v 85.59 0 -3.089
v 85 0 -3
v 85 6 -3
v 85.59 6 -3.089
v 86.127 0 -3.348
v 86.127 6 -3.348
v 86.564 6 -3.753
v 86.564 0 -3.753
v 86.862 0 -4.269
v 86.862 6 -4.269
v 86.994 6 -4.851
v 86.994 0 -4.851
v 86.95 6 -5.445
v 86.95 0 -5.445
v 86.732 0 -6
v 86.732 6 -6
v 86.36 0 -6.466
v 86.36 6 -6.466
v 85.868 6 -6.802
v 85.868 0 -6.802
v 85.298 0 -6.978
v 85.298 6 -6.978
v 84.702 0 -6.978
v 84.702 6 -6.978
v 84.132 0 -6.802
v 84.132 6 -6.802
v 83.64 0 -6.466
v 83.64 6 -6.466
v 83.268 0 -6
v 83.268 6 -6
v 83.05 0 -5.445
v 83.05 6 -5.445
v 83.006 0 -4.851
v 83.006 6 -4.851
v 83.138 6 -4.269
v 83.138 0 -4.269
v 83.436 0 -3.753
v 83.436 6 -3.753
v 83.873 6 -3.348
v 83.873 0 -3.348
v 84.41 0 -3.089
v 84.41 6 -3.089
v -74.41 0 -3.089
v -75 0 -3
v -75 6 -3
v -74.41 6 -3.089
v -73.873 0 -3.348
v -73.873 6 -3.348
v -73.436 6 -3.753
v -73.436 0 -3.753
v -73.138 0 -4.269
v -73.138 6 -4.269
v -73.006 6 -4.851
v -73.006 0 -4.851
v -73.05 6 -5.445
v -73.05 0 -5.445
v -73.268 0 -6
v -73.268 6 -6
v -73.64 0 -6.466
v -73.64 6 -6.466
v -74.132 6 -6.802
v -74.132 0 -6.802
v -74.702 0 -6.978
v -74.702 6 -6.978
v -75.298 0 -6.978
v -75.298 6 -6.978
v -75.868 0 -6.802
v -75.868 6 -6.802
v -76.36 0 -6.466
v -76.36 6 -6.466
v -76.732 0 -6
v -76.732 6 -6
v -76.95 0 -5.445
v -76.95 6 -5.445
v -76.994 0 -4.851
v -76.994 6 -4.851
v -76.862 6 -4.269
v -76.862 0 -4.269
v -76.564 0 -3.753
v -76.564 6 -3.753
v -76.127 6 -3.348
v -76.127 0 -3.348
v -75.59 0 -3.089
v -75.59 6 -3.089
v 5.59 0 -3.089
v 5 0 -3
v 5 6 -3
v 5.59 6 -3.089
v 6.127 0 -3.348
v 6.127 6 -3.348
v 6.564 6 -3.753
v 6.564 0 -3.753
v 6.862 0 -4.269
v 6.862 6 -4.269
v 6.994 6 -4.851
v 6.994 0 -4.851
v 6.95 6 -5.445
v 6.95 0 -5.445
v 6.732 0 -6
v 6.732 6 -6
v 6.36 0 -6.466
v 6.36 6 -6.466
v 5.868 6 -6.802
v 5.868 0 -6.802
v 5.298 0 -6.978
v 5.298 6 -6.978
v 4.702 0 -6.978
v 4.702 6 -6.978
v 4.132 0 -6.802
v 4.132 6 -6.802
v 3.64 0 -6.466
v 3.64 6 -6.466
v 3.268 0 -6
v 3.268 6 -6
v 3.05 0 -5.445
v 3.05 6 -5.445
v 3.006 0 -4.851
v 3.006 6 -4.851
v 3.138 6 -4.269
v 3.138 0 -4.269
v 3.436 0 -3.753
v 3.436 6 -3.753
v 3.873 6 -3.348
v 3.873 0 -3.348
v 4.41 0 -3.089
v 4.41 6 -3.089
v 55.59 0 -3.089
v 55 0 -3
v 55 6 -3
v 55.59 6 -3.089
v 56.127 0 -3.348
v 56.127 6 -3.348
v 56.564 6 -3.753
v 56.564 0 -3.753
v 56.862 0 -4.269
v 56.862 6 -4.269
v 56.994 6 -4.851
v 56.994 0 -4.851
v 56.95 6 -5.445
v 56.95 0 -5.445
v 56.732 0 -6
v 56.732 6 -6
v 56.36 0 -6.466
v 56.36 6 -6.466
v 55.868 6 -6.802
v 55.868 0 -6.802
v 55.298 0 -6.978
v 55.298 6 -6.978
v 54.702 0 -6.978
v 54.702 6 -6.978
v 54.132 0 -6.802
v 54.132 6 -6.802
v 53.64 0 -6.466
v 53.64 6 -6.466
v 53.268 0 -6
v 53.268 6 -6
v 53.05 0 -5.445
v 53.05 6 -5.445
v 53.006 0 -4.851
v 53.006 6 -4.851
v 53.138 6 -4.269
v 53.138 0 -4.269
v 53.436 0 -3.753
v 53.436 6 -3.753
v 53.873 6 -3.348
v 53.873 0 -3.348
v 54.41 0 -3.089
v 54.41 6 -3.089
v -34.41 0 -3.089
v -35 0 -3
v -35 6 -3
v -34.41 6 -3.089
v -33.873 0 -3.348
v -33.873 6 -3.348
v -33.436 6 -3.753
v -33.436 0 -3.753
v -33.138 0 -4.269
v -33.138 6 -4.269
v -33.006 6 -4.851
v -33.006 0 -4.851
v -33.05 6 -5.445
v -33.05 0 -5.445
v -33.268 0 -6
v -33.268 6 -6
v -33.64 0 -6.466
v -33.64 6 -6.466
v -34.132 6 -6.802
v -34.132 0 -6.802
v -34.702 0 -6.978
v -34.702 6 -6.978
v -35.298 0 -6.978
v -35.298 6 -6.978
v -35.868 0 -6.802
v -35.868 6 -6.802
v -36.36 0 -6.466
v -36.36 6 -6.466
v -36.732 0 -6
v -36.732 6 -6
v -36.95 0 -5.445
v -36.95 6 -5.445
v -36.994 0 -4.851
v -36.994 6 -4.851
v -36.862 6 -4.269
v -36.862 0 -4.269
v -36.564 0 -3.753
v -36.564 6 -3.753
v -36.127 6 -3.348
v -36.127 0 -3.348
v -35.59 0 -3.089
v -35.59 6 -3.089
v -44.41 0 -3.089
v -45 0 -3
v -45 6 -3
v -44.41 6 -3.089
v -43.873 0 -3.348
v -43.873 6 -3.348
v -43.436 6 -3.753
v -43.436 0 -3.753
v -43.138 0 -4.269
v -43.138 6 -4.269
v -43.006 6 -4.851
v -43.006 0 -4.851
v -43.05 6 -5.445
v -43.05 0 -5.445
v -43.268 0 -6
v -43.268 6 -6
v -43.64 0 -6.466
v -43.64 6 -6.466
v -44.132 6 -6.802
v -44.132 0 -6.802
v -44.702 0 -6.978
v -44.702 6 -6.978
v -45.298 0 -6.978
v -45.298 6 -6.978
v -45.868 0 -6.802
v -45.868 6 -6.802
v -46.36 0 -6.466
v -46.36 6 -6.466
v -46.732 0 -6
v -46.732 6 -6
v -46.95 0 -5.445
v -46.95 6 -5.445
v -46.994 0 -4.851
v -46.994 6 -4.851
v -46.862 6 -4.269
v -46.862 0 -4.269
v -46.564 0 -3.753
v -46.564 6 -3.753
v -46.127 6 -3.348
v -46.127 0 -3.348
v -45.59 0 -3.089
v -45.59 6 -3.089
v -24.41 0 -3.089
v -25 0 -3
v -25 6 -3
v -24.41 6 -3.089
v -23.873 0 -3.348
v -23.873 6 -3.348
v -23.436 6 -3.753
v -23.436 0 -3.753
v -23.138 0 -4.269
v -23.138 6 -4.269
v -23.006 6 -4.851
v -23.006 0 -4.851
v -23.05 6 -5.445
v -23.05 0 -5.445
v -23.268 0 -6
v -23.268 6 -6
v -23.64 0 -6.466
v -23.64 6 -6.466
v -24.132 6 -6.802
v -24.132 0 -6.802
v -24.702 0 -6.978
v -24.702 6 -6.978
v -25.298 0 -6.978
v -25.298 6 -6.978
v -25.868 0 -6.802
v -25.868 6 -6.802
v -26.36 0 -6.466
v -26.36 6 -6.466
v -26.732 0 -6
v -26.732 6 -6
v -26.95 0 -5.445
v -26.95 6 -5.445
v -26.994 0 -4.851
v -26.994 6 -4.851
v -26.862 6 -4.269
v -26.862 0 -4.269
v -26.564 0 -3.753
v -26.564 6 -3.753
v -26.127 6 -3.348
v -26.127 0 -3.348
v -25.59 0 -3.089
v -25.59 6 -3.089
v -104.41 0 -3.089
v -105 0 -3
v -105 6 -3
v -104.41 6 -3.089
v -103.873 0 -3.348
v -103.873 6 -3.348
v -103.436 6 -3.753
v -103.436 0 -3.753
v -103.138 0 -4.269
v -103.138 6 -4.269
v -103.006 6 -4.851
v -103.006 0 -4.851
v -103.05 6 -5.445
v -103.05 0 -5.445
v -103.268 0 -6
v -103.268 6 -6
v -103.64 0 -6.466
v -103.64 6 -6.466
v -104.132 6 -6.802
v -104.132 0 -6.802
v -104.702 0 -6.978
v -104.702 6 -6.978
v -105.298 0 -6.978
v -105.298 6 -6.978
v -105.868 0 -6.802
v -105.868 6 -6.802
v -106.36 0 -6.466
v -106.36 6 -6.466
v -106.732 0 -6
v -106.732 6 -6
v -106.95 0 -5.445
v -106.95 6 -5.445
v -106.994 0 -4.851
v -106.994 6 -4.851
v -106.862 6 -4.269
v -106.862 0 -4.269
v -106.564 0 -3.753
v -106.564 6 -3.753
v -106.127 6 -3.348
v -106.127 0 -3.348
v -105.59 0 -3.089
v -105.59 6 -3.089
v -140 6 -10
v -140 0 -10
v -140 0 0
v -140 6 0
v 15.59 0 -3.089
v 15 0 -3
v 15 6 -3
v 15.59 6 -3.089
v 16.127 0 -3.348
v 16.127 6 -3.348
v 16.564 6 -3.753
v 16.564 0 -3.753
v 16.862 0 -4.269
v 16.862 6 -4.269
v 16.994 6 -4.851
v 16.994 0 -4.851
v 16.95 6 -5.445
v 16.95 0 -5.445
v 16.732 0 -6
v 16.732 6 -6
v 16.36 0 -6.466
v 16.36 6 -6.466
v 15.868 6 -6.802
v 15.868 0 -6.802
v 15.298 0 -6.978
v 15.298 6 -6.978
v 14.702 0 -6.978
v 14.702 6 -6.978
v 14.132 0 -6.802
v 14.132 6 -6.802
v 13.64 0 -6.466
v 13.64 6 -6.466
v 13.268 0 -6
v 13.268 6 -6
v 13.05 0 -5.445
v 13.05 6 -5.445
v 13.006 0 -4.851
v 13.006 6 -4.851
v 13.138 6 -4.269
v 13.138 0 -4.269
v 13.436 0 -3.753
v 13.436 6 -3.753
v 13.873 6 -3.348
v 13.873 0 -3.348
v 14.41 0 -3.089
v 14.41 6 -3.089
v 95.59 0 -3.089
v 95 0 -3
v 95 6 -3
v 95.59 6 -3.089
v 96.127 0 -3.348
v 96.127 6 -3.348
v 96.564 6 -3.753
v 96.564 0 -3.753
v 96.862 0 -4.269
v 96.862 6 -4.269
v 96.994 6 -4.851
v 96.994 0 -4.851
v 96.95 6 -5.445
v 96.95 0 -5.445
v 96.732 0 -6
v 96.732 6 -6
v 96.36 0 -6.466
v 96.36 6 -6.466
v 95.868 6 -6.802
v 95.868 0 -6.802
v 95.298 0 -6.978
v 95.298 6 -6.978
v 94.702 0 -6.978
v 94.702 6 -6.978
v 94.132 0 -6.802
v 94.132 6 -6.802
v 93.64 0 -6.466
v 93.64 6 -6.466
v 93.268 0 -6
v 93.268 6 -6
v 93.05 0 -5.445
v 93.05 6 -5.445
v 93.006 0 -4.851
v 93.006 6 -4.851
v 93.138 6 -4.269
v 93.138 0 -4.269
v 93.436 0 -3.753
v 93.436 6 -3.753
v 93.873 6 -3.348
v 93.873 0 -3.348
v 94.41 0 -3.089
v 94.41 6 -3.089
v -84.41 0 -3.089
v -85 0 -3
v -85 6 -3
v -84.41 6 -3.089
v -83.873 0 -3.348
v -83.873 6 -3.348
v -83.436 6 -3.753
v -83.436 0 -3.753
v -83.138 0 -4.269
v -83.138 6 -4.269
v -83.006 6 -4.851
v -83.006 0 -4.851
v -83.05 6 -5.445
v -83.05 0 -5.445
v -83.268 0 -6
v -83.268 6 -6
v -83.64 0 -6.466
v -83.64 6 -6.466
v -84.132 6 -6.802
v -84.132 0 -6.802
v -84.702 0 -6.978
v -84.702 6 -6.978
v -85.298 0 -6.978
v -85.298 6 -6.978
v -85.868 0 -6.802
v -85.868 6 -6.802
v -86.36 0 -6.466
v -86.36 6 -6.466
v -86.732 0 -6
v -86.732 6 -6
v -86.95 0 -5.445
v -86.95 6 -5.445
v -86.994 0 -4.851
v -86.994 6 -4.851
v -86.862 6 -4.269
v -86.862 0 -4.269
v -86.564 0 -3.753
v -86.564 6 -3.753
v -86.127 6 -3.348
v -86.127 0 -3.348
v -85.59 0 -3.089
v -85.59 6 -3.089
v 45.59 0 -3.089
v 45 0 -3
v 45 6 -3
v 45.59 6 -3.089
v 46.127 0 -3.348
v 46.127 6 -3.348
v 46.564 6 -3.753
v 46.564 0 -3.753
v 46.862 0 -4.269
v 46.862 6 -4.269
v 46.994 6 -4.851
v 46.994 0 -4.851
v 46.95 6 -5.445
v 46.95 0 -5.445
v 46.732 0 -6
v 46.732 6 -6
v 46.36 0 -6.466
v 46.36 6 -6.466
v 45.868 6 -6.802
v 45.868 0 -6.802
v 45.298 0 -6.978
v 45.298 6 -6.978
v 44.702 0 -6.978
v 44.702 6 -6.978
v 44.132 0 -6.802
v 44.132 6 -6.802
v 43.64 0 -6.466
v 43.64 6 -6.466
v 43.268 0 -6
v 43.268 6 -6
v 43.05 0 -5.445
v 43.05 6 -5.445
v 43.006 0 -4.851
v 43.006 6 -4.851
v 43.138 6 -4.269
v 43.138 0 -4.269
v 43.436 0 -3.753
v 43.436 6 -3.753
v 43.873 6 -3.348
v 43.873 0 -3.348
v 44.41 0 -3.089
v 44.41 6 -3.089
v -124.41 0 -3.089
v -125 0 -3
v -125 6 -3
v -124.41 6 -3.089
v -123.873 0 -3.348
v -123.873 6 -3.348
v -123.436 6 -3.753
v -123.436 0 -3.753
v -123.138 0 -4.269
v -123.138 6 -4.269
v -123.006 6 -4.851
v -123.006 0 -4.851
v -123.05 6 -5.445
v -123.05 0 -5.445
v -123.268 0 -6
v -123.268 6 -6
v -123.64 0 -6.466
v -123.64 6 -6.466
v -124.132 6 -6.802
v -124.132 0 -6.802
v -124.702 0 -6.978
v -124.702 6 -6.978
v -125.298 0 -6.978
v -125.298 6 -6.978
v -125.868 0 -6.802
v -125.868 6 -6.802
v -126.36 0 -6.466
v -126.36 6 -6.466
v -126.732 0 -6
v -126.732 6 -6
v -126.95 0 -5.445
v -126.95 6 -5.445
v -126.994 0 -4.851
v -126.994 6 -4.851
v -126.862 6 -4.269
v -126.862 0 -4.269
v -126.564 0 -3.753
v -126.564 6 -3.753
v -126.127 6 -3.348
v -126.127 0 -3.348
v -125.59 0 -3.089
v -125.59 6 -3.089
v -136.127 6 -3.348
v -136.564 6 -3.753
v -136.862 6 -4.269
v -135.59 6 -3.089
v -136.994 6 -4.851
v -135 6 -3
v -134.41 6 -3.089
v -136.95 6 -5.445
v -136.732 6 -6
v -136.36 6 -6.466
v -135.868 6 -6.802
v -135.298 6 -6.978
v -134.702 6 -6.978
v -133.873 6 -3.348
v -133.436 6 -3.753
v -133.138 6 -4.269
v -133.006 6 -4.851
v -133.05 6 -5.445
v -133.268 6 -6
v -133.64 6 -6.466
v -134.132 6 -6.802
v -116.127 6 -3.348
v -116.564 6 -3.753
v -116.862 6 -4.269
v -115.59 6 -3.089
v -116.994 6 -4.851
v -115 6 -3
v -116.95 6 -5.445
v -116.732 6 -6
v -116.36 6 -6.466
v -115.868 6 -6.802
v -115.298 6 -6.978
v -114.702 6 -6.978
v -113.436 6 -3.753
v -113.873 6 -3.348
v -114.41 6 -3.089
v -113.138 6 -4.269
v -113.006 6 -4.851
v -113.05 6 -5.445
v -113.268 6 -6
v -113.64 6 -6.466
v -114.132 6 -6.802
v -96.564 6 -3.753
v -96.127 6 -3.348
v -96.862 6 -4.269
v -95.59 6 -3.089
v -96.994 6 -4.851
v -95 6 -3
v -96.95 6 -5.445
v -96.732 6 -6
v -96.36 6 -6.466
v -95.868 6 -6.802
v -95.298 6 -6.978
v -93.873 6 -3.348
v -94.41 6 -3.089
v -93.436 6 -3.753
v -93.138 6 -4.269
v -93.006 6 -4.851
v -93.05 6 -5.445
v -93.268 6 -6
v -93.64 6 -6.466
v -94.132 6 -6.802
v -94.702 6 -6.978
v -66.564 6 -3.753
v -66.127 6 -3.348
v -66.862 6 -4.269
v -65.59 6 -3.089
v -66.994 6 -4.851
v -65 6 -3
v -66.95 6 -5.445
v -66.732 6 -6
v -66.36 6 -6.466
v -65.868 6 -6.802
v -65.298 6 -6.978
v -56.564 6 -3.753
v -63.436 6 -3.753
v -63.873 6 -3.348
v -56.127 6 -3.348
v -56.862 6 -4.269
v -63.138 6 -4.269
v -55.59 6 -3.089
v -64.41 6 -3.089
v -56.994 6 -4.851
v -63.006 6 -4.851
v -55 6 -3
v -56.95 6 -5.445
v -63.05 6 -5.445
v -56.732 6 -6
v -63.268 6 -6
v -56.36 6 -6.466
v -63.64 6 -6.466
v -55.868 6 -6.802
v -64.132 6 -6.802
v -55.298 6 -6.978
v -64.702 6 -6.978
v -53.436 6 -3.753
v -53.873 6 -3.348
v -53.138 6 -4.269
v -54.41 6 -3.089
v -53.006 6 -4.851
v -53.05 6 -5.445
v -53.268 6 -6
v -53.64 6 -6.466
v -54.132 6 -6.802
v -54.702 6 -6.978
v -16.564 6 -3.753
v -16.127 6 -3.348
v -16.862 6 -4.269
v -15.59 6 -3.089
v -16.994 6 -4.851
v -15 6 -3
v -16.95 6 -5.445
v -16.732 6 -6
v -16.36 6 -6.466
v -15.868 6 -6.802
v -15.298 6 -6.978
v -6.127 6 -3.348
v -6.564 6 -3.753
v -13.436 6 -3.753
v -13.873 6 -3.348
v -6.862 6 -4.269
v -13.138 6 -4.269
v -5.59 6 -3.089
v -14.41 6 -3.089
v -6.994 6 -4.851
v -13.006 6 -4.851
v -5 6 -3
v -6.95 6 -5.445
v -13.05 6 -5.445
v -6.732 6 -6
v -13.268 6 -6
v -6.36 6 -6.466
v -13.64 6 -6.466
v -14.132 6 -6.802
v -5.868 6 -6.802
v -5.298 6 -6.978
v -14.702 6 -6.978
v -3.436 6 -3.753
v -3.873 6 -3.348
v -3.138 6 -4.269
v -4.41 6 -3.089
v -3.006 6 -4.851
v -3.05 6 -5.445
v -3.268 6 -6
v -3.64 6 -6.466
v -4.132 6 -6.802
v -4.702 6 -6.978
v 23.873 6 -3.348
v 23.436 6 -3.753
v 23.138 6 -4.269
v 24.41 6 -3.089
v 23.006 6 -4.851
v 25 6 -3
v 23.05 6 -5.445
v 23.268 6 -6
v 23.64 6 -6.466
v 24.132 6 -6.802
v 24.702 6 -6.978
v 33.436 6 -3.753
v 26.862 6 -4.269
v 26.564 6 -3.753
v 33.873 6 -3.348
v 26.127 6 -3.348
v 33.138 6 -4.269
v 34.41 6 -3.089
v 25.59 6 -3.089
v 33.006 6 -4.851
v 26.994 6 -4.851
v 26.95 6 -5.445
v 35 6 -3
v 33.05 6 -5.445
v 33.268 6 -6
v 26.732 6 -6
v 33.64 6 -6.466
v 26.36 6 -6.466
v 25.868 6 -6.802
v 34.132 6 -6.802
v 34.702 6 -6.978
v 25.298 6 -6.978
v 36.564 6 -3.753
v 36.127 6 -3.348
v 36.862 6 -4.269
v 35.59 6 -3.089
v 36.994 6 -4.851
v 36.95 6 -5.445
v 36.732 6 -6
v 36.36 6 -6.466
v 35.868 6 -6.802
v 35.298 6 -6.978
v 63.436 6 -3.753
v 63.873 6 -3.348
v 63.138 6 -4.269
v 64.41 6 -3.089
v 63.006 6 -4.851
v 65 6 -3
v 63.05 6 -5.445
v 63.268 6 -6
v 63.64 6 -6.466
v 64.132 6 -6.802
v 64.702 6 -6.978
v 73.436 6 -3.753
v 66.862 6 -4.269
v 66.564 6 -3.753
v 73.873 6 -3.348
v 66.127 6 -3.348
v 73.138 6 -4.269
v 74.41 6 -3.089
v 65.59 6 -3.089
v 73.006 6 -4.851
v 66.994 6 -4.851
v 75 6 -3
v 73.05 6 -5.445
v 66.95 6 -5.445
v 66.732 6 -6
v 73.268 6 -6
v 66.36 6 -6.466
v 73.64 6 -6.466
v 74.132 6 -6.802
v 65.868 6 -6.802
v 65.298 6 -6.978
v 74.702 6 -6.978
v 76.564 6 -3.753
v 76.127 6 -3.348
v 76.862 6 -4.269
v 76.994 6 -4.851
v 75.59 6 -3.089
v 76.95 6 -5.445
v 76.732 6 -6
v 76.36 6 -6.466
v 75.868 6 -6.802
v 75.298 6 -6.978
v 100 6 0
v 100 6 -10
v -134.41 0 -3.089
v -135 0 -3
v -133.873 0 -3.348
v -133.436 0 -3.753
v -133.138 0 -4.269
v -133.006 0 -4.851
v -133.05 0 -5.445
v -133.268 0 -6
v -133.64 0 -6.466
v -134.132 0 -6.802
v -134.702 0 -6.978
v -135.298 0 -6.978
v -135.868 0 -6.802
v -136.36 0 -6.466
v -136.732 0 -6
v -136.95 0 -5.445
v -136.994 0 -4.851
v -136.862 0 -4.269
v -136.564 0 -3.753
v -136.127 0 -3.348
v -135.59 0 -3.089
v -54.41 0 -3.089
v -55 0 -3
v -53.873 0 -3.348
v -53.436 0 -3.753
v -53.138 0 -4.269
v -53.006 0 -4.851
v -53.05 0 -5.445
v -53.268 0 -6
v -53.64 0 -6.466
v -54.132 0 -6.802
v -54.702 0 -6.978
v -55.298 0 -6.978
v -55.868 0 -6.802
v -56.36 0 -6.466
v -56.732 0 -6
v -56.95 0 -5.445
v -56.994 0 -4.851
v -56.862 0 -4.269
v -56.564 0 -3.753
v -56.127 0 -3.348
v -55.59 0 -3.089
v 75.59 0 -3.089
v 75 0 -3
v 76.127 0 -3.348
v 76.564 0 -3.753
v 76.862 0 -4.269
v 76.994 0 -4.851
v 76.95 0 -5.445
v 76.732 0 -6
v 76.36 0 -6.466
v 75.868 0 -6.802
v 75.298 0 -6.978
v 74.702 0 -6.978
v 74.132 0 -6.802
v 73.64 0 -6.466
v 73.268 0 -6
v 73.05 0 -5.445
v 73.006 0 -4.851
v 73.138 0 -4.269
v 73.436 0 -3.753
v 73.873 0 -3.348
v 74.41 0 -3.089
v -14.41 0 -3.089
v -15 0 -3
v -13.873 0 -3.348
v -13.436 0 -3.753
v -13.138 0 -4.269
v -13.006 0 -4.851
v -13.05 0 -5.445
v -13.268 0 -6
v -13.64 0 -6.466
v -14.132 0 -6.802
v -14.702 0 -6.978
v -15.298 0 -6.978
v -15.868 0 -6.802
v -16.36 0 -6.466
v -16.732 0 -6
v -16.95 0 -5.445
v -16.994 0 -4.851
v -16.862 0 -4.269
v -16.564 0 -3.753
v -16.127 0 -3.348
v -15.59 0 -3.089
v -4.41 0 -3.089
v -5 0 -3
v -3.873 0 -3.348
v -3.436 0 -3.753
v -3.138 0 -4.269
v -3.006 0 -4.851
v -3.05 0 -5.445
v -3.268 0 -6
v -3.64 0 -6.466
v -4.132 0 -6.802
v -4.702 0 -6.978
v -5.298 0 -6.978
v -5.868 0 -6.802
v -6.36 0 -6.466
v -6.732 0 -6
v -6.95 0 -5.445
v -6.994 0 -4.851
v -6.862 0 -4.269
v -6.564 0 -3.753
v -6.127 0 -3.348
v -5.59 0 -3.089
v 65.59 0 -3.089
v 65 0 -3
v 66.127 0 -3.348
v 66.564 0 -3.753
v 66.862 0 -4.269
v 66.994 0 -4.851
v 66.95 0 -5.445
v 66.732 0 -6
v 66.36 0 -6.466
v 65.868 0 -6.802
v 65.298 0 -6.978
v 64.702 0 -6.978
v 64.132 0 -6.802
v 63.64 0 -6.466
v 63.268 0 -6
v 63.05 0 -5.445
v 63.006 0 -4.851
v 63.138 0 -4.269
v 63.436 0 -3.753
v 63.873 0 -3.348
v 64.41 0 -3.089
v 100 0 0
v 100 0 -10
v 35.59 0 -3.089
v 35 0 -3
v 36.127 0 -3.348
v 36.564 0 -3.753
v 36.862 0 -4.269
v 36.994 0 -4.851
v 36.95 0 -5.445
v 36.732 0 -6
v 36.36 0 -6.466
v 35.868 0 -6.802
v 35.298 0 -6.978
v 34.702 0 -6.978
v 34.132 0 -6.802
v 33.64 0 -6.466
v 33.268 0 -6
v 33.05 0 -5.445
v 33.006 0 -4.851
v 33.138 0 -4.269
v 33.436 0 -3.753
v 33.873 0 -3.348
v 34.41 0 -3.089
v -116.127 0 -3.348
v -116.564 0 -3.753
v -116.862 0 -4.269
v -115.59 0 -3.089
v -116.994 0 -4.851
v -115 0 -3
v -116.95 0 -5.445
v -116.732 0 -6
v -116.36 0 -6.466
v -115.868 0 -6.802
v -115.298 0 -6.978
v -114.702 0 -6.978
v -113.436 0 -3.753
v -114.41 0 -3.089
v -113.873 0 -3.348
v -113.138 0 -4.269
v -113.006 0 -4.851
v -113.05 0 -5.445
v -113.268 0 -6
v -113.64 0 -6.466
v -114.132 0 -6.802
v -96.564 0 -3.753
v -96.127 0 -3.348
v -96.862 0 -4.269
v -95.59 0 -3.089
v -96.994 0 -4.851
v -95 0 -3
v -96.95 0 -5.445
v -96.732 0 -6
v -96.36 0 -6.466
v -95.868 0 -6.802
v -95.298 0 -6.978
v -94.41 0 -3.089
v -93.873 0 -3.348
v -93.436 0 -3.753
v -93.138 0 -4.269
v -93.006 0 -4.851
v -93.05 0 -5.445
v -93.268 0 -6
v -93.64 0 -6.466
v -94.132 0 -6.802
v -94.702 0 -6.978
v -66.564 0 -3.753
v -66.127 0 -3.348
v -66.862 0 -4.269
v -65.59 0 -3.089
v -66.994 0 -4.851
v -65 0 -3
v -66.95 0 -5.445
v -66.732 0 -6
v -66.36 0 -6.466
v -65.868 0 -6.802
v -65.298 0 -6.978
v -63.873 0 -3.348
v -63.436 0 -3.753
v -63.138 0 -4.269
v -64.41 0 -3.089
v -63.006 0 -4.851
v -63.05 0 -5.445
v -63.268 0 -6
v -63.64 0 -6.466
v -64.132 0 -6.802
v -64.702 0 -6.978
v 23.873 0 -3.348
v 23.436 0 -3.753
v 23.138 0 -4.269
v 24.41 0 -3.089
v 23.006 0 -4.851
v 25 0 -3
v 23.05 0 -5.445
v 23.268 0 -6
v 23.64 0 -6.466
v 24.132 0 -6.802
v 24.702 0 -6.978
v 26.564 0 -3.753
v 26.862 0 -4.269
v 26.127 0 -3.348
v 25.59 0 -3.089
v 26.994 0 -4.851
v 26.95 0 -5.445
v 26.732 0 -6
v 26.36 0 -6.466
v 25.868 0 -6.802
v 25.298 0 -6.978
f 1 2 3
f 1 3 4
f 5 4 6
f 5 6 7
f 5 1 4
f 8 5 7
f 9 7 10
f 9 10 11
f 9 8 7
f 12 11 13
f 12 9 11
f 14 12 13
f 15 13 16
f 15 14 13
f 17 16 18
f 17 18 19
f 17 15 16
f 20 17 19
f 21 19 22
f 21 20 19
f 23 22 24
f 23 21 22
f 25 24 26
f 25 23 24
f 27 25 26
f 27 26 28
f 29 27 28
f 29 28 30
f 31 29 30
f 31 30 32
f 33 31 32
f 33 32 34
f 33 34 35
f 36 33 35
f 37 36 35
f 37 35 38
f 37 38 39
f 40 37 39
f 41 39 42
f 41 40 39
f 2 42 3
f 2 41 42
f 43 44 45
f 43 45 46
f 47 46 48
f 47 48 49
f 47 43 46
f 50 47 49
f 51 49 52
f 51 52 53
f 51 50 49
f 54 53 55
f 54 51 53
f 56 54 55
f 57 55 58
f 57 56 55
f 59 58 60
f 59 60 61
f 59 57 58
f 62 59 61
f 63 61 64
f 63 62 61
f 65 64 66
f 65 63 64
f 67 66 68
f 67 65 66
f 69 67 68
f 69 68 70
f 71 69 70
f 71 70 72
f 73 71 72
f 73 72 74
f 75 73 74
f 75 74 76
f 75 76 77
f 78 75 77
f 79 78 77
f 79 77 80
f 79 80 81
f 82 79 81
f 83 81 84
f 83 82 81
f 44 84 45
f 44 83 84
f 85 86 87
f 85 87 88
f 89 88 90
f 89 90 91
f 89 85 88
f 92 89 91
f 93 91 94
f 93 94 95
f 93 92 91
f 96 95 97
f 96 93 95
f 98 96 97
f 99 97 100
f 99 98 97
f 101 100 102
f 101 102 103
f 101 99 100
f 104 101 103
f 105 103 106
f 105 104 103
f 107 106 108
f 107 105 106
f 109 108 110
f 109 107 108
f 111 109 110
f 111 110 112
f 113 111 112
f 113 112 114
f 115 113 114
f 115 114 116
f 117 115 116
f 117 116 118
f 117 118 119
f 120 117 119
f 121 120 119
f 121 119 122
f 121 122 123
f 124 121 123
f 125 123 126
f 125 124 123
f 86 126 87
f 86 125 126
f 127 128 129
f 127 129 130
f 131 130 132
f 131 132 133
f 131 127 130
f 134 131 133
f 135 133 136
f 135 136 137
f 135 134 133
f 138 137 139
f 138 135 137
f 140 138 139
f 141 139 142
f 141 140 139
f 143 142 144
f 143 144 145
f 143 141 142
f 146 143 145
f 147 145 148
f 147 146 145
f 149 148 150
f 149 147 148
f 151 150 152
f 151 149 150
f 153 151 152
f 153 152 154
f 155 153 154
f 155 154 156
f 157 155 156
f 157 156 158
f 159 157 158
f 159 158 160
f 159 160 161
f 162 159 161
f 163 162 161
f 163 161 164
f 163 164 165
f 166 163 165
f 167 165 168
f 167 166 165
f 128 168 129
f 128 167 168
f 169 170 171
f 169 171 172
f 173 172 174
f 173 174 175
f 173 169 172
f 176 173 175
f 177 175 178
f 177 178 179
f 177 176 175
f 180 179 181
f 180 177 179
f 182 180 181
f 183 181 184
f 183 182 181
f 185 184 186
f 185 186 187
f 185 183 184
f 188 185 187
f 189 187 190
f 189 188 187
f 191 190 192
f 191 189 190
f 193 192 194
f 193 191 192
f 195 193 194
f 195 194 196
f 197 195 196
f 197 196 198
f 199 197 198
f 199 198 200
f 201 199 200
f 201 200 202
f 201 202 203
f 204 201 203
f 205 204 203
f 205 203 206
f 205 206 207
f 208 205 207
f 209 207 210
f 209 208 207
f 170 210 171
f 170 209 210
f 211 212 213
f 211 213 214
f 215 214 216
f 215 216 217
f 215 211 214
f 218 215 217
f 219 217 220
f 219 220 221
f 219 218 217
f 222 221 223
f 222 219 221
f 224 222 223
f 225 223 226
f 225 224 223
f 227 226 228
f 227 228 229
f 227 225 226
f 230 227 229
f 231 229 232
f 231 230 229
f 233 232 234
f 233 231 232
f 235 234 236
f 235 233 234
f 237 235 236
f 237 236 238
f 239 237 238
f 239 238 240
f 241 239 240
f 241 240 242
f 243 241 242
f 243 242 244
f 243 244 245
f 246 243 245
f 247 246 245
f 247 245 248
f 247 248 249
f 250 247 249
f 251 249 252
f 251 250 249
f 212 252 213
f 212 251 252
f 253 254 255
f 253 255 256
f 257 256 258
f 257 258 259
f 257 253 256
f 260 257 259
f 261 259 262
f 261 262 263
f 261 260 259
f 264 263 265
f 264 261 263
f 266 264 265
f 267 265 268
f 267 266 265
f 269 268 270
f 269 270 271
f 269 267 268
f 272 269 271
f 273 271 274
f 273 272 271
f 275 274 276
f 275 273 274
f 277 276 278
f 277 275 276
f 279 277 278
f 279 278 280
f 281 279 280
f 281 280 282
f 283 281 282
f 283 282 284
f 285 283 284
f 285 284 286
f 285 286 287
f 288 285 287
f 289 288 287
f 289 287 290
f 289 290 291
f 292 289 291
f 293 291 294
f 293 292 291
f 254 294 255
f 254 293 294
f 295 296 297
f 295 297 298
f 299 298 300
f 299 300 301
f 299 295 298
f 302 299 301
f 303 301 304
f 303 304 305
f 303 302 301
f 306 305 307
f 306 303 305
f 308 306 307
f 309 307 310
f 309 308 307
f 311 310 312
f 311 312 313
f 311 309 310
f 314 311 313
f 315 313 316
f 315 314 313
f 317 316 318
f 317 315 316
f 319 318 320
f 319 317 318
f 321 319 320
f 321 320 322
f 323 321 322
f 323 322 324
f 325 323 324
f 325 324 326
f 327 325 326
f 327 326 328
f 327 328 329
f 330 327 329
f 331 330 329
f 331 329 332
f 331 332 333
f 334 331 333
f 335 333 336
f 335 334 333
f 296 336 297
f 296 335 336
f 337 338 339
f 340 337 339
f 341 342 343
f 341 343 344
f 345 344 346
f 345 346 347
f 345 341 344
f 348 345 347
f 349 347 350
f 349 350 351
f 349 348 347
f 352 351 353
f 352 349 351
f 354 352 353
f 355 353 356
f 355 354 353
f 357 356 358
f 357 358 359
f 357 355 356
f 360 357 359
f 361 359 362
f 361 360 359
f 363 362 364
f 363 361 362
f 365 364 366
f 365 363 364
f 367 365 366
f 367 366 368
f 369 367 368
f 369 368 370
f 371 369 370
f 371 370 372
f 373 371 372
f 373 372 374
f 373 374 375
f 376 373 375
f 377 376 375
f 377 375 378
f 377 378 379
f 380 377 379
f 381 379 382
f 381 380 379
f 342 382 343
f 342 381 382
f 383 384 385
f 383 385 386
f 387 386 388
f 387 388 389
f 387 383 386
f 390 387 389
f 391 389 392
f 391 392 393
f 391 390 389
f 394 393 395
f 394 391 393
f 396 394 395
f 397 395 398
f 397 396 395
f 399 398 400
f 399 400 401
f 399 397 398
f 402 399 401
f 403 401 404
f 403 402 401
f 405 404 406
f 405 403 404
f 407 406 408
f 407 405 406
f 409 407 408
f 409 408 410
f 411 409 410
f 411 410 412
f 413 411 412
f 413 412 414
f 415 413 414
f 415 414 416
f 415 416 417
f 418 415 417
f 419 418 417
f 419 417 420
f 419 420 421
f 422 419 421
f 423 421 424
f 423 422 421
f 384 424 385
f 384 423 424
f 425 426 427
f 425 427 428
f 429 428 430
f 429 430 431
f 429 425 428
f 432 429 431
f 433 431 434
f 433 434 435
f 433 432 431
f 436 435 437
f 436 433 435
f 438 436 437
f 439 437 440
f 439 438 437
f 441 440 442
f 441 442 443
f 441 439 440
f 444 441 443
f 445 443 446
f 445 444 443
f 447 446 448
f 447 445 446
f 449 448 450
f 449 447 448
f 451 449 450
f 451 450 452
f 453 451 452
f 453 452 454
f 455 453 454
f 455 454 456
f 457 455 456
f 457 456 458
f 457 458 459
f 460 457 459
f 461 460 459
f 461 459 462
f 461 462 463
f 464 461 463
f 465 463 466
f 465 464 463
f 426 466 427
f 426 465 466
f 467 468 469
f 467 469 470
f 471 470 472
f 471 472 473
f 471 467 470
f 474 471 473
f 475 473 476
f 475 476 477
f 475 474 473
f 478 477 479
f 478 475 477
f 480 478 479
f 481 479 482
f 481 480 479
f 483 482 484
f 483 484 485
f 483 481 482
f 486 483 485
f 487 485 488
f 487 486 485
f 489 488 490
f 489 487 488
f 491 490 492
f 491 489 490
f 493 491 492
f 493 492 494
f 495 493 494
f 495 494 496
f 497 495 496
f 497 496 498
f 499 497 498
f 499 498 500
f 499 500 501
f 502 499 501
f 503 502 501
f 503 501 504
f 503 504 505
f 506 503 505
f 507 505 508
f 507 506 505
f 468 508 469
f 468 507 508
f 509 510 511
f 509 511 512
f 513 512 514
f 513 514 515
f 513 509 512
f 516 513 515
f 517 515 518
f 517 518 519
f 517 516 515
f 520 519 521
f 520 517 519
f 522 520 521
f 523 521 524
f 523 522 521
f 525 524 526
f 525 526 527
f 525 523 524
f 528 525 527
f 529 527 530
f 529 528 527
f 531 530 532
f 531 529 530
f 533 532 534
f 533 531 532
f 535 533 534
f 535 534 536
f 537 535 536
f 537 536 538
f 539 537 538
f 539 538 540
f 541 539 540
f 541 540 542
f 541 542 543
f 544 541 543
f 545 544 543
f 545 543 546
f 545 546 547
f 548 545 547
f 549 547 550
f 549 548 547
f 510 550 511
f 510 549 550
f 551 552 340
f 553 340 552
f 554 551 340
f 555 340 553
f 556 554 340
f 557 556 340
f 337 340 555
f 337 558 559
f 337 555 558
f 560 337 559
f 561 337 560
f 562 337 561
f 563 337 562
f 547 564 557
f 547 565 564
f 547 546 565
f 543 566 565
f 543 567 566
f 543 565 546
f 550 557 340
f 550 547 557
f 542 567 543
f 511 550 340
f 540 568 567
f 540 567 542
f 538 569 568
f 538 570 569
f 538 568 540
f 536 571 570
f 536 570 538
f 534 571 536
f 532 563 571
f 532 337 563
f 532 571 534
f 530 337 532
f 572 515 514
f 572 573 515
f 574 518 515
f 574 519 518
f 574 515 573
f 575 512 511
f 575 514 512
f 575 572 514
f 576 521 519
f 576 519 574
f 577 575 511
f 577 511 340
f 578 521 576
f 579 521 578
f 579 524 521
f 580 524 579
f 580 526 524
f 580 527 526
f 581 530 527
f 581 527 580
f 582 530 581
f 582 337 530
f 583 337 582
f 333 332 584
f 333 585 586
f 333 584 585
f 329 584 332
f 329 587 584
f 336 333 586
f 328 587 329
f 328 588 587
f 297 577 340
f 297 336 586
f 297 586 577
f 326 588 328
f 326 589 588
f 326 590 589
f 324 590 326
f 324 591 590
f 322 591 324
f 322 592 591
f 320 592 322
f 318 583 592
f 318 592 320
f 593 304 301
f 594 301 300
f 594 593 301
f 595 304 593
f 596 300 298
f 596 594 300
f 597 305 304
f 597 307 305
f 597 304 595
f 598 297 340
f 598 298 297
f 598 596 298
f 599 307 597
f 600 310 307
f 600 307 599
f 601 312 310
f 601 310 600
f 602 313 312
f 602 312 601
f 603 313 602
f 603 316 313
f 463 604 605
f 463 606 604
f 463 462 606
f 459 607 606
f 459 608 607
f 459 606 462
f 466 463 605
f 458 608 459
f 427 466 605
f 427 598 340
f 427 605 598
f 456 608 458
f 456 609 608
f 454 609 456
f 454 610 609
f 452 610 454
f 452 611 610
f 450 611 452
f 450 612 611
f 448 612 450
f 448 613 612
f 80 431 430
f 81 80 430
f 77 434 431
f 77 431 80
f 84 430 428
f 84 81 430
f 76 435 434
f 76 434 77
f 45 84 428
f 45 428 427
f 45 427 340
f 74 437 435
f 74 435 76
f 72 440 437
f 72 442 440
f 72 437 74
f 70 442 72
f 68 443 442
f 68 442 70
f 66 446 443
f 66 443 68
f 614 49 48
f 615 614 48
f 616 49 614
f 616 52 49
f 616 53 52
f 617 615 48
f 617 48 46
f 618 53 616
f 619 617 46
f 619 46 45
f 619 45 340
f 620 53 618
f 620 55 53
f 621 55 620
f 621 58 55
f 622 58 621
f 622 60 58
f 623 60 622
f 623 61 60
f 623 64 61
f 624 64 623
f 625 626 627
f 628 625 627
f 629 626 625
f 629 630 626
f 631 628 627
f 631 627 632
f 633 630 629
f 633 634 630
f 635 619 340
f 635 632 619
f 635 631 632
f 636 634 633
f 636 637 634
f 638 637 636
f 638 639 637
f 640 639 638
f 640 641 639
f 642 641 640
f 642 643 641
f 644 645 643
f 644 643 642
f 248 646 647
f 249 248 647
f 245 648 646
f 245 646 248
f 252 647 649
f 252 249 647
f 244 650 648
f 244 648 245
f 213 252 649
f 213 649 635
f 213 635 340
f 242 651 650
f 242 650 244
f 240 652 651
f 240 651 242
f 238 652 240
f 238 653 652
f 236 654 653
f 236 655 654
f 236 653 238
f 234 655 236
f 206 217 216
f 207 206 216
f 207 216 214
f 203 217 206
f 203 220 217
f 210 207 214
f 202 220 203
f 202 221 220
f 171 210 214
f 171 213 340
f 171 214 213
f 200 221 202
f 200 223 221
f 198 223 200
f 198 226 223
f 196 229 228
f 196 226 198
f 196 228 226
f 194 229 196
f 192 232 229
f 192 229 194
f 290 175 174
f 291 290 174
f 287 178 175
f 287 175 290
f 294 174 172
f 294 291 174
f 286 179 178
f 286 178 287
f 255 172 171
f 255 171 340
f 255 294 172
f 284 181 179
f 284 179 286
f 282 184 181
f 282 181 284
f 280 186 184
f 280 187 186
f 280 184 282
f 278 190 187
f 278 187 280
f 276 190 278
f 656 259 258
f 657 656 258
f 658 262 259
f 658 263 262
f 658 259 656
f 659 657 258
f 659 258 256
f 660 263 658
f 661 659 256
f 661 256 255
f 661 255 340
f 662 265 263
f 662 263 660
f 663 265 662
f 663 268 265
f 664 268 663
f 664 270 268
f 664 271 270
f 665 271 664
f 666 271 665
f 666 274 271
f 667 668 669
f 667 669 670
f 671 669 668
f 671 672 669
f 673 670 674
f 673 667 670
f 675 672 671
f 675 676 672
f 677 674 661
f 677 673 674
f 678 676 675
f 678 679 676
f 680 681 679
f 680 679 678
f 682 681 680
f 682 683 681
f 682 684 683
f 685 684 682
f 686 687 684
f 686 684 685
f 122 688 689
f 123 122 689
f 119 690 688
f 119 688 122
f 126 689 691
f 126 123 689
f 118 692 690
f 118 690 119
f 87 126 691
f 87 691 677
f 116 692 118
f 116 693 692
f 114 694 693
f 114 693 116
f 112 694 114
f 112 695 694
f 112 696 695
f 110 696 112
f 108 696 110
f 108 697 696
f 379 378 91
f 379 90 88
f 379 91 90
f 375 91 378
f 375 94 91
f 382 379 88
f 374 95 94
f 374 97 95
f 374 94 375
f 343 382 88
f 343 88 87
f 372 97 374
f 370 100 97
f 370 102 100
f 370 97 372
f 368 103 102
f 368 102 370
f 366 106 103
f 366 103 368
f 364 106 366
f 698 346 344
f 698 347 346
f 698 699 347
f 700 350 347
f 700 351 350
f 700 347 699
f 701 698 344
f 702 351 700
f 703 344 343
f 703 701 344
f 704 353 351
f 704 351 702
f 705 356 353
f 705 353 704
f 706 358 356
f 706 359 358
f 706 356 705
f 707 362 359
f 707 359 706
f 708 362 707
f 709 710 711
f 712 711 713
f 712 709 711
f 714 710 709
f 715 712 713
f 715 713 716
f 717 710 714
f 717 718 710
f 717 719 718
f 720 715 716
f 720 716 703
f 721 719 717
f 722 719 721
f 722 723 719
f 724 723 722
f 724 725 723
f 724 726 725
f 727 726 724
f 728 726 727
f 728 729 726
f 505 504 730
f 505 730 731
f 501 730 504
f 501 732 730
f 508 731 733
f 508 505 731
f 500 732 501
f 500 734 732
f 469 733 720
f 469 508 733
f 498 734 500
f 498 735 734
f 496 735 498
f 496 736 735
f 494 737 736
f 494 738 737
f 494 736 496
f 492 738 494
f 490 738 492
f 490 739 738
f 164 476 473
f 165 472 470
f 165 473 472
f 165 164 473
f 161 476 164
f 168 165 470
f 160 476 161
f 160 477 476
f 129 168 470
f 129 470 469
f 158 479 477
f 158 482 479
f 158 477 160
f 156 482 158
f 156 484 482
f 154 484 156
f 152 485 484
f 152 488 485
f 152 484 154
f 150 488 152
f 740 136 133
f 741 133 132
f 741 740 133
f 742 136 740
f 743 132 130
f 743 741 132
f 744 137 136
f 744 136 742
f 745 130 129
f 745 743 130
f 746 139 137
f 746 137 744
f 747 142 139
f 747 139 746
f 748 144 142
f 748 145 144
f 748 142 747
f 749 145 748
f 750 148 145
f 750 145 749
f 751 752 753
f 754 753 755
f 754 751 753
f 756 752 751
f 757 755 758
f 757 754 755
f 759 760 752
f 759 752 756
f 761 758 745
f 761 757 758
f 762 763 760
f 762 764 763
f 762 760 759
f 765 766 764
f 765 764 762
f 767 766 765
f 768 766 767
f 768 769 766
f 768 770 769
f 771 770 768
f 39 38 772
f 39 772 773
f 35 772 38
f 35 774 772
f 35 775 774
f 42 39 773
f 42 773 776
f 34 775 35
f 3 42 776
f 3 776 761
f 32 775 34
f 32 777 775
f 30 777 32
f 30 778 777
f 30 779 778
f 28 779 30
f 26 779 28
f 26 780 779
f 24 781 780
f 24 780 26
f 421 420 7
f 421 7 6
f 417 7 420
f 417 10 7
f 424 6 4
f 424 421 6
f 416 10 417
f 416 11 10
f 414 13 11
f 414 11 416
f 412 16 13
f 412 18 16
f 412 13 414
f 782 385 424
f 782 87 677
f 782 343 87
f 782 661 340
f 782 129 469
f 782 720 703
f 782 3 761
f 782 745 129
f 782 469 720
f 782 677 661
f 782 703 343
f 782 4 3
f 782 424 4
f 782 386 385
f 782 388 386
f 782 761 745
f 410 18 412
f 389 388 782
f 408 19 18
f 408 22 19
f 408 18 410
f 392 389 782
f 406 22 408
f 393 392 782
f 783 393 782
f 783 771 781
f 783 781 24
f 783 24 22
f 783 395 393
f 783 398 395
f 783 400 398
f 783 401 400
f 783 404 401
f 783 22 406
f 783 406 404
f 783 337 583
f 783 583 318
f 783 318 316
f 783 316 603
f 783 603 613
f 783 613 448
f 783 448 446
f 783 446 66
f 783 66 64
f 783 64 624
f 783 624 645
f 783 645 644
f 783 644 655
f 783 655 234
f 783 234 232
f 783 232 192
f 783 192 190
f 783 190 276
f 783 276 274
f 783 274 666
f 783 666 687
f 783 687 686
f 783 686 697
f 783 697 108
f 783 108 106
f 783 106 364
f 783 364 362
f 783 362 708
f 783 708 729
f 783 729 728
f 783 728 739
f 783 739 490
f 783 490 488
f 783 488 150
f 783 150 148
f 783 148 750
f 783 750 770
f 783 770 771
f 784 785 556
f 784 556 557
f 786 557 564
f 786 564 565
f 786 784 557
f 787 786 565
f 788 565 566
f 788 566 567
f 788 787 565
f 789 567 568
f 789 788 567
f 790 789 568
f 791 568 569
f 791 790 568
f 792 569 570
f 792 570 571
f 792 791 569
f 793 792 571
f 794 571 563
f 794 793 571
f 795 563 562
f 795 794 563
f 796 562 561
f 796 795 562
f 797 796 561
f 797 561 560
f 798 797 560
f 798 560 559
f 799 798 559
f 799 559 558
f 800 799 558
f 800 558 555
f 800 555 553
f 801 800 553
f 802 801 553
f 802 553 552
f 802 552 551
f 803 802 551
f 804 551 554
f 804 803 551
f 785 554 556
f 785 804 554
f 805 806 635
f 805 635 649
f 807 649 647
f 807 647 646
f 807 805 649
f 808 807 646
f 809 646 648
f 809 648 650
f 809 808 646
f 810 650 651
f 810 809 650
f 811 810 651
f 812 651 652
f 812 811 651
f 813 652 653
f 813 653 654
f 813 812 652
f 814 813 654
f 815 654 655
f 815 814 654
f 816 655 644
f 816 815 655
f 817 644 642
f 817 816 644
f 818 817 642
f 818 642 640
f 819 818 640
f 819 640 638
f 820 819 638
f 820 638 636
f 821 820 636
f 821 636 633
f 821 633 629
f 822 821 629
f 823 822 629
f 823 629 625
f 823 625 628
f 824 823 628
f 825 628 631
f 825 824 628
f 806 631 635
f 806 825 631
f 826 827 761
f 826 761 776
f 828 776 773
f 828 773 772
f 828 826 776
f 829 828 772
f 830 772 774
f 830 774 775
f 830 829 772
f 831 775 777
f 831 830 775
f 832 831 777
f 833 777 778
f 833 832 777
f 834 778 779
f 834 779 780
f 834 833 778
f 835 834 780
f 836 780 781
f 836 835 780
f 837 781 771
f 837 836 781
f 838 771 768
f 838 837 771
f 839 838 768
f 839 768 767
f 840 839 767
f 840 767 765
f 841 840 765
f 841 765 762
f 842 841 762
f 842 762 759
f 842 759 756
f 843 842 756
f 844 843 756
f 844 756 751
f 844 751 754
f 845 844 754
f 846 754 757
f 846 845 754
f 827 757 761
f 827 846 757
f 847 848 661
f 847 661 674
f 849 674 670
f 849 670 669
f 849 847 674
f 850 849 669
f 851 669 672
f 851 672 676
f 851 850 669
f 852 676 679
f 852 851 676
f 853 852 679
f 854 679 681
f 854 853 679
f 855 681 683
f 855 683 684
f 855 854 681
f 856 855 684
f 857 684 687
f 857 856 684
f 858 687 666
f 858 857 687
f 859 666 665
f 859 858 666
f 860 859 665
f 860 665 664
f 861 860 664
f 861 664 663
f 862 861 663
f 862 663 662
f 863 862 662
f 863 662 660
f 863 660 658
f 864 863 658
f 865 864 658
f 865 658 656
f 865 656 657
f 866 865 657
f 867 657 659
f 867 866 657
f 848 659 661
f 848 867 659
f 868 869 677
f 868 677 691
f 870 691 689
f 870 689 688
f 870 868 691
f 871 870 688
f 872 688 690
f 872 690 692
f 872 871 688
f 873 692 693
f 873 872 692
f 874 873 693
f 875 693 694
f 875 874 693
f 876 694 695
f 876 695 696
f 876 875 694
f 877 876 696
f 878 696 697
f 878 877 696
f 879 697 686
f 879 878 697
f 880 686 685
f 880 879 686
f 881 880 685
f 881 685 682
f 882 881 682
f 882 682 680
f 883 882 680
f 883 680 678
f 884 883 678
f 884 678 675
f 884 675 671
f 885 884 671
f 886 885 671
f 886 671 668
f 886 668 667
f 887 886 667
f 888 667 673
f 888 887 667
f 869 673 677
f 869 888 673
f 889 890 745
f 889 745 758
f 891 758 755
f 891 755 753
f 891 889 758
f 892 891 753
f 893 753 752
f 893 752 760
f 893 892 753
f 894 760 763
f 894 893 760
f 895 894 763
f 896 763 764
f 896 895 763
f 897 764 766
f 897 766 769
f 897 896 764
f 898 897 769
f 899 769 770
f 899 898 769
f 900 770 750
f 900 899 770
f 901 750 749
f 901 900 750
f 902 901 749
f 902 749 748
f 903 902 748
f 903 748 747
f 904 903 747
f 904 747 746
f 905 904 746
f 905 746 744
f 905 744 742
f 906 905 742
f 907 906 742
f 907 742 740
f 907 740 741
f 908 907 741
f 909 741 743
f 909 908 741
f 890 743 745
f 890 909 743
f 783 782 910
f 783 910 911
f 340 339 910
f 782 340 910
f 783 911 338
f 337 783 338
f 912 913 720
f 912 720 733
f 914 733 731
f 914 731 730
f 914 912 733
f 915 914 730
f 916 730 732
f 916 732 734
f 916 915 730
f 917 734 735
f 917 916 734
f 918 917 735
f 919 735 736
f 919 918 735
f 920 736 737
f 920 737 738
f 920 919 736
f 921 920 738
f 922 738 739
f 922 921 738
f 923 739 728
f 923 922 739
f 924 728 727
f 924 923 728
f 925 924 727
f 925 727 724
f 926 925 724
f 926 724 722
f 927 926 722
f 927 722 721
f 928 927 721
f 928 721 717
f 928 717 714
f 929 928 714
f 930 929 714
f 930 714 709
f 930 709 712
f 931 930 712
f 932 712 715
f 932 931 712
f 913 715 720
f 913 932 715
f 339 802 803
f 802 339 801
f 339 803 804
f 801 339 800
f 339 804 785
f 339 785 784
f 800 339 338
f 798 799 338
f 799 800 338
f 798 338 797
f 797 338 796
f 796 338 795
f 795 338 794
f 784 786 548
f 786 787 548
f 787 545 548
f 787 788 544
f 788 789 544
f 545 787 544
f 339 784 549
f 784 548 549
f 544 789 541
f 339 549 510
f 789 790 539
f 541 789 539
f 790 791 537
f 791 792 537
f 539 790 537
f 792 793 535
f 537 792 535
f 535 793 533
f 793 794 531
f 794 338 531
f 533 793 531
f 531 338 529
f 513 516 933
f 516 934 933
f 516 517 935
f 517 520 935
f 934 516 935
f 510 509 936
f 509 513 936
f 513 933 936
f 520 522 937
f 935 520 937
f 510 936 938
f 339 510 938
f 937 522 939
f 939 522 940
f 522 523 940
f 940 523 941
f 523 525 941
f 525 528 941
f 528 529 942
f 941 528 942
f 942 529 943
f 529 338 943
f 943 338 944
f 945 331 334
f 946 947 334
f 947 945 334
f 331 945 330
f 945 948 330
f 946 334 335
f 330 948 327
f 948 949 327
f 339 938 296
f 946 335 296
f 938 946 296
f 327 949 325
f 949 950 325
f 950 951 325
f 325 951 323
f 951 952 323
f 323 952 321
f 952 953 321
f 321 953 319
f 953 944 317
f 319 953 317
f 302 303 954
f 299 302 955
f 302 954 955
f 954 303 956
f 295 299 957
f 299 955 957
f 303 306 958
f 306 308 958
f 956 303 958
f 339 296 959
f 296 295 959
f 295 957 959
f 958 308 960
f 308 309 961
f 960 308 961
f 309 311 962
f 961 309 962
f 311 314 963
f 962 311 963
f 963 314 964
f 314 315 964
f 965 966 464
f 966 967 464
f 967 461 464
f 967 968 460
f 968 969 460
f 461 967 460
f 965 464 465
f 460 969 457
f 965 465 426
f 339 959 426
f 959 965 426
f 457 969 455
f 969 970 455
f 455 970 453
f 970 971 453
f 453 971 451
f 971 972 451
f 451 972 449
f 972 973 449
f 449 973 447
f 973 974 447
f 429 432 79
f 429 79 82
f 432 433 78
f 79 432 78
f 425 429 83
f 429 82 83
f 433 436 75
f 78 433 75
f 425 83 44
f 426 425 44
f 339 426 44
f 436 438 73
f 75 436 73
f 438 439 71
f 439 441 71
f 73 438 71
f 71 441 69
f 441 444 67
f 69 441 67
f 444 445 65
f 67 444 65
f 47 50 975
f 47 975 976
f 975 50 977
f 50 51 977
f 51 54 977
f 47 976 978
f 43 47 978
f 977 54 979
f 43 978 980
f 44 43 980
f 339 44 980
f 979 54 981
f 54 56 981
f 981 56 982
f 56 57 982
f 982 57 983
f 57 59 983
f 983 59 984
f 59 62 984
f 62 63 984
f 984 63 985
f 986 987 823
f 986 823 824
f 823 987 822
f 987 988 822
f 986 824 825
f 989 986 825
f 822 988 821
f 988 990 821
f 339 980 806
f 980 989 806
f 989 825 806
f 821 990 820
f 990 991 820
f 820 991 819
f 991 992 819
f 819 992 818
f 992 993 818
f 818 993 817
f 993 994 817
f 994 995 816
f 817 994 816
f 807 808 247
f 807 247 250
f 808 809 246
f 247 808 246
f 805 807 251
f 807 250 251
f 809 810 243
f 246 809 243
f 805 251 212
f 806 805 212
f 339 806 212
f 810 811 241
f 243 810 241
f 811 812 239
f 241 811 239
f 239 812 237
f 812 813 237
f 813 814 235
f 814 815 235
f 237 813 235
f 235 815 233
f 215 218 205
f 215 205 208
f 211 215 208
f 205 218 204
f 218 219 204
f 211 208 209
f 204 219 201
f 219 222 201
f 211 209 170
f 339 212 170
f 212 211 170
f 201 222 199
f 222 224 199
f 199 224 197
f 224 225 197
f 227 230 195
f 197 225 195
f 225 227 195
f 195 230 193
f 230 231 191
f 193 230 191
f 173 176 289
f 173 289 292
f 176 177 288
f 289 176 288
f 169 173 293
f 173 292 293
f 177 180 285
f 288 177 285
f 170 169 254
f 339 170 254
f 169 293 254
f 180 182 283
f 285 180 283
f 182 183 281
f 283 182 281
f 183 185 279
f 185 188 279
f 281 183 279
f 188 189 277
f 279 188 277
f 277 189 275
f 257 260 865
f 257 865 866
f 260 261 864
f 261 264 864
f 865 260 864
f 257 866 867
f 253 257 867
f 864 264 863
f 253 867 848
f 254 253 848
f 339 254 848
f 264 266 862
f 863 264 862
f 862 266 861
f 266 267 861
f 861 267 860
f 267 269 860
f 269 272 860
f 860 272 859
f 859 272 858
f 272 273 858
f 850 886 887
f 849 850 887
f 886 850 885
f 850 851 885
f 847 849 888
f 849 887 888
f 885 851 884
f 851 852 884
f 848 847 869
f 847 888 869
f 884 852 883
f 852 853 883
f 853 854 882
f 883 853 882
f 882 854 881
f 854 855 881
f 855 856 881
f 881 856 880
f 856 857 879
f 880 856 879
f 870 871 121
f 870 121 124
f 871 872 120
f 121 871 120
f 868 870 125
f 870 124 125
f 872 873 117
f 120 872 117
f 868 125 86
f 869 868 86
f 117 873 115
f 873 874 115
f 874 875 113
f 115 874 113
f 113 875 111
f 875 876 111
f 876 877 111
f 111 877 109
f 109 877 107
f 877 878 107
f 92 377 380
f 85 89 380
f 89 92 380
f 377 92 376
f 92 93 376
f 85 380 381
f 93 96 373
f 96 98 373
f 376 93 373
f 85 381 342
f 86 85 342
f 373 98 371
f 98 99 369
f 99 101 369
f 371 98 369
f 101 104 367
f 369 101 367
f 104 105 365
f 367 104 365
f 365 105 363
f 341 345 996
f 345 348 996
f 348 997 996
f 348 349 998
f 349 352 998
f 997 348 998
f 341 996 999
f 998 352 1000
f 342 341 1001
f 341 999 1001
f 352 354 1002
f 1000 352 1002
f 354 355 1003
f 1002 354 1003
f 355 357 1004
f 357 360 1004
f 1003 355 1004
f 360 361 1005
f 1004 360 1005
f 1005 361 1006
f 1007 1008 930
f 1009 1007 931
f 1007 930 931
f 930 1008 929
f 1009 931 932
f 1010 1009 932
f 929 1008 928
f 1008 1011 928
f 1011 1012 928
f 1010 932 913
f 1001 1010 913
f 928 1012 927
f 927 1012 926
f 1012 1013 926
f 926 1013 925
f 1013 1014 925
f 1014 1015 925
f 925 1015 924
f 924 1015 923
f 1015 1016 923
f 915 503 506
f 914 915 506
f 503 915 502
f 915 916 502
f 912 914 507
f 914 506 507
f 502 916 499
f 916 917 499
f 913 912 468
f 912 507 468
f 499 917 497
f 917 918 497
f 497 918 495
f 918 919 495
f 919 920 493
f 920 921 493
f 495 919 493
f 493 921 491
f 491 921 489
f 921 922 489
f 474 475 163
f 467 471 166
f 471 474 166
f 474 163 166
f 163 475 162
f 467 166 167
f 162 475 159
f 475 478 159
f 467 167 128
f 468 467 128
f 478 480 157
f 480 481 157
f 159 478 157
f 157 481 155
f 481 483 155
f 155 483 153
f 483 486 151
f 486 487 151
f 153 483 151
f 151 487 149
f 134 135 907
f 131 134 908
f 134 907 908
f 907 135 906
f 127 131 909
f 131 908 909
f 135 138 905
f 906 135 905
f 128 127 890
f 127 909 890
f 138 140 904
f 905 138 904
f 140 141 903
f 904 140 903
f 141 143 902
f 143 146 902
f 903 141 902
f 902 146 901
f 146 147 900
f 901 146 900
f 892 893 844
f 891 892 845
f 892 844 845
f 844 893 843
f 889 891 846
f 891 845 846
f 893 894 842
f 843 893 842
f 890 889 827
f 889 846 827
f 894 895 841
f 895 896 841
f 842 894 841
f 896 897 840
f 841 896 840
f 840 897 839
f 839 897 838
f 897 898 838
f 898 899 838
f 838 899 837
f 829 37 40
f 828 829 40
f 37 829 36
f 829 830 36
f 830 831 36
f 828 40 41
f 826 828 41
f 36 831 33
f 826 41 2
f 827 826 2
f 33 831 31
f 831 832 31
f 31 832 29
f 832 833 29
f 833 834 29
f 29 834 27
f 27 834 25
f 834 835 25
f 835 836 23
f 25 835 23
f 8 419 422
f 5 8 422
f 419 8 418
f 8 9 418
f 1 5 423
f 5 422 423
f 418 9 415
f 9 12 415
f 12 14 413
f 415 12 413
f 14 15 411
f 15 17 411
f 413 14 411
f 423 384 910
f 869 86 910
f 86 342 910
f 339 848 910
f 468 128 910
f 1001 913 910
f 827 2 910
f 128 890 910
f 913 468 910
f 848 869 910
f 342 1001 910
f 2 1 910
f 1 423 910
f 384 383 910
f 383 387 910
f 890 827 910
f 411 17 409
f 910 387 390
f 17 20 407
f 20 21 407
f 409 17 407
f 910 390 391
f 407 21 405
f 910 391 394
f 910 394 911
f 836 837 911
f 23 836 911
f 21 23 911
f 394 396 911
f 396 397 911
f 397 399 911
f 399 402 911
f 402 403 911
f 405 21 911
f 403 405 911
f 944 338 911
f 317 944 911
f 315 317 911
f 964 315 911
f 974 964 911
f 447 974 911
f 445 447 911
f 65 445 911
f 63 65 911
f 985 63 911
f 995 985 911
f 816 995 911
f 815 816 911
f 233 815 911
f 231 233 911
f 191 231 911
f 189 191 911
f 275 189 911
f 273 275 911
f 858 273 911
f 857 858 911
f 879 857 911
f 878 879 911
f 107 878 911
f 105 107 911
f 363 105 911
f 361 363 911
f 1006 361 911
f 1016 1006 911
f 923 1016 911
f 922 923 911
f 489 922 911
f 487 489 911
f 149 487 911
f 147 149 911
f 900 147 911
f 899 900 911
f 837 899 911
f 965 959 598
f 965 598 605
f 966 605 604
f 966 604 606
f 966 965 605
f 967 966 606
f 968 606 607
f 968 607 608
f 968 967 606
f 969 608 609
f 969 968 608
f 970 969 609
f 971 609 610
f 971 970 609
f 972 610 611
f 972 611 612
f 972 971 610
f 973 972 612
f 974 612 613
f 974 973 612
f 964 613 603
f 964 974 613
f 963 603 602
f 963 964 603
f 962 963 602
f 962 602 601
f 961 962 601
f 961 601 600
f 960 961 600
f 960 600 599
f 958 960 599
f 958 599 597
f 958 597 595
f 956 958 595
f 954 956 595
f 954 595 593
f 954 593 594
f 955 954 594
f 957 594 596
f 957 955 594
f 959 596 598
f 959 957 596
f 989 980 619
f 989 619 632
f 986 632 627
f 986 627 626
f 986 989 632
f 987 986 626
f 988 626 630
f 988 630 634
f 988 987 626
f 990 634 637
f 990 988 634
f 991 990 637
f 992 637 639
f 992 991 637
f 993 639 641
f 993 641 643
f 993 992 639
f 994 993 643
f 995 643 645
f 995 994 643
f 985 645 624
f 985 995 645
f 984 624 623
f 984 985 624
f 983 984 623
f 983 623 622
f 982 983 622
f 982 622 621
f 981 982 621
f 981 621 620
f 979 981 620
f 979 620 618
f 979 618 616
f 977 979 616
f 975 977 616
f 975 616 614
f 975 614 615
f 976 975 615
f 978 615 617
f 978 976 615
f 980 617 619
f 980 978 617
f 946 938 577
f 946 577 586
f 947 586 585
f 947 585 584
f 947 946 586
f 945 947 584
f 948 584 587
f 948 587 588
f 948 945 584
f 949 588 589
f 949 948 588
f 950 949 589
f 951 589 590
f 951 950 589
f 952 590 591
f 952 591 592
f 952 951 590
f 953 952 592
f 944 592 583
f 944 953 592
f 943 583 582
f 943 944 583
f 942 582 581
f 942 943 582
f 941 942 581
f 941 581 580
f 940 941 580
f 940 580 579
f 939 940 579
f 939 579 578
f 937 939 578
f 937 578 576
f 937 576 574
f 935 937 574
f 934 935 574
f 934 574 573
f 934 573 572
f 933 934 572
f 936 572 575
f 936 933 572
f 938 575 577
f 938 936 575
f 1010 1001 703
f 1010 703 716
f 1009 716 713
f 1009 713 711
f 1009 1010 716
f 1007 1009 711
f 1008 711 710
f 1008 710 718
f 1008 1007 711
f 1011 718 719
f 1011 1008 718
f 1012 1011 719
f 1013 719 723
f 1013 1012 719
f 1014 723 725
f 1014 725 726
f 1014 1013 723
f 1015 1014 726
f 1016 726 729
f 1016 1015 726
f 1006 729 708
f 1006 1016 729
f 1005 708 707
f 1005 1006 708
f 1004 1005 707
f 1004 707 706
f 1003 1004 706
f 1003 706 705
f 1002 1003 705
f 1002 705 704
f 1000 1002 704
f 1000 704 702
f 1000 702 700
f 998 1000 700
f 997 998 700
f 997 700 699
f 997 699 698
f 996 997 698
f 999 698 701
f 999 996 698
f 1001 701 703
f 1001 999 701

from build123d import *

# Parameters (mm, degrees)
ESQUISSE1_R             = 2
BOSS_EXTRU_1_DEPTH      = 6
ENL_V_MAT_EXTRU_1_REACH = 142.485
ESQUISSE2_W             = 40
ESQUISSE2_H             = 10


with BuildPart() as part:
    # Esquisse1 → Boss.-Extru.1 (new body)
    with BuildSketch(Plane(origin=(0, 0, 0), x_dir=(1, 0, 0), z_dir=(0, 1, 0))):
        Polygon((0, 0), (140, 0), (140, 10), (-140, 10), (-140, 0), align=None)
        with Locations(Location((-135, 5, 0), (0, 0, 270))):
            Circle(ESQUISSE1_R, mode=Mode.SUBTRACT)
        with Locations(Location((-125, 5, 0), (0, 0, 270))):
            Circle(ESQUISSE1_R, mode=Mode.SUBTRACT)
        with Locations(Location((-115, 5, 0), (0, 0, 270))):
            Circle(ESQUISSE1_R, mode=Mode.SUBTRACT)
        with Locations(Location((-105, 5, 0), (0, 0, 270))):
            Circle(ESQUISSE1_R, mode=Mode.SUBTRACT)
        with Locations(Location((-95, 5, 0), (0, 0, 270))):
            Circle(ESQUISSE1_R, mode=Mode.SUBTRACT)
        with Locations(Location((-85, 5, 0), (0, 0, 270))):
            Circle(ESQUISSE1_R, mode=Mode.SUBTRACT)
        with Locations(Location((-75, 5, 0), (0, 0, 270))):
            Circle(ESQUISSE1_R, mode=Mode.SUBTRACT)
        with Locations(Location((-65, 5, 0), (0, 0, 270))):
            Circle(ESQUISSE1_R, mode=Mode.SUBTRACT)
        with Locations(Location((-55, 5, 0), (0, 0, 270))):
            Circle(ESQUISSE1_R, mode=Mode.SUBTRACT)
        with Locations(Location((-45, 5, 0), (0, 0, 270))):
            Circle(ESQUISSE1_R, mode=Mode.SUBTRACT)
        with Locations(Location((-35, 5, 0), (0, 0, 270))):
            Circle(ESQUISSE1_R, mode=Mode.SUBTRACT)
        with Locations(Location((-25, 5, 0), (0, 0, 270))):
            Circle(ESQUISSE1_R, mode=Mode.SUBTRACT)
        with Locations(Location((-15, 5, 0), (0, 0, 270))):
            Circle(ESQUISSE1_R, mode=Mode.SUBTRACT)
        with Locations(Location((-5, 5, 0), (0, 0, 270))):
            Circle(ESQUISSE1_R, mode=Mode.SUBTRACT)
        with Locations(Location((5, 5, 0), (0, 0, 270))):
            Circle(ESQUISSE1_R, mode=Mode.SUBTRACT)
        with Locations(Location((15, 5, 0), (0, 0, 270))):
            Circle(ESQUISSE1_R, mode=Mode.SUBTRACT)
        with Locations(Location((25, 5, 0), (0, 0, 270))):
            Circle(ESQUISSE1_R, mode=Mode.SUBTRACT)
        with Locations(Location((35, 5, 0), (0, 0, 270))):
            Circle(ESQUISSE1_R, mode=Mode.SUBTRACT)
        with Locations(Location((45, 5, 0), (0, 0, 270))):
            Circle(ESQUISSE1_R, mode=Mode.SUBTRACT)
        with Locations(Location((55, 5, 0), (0, 0, 270))):
            Circle(ESQUISSE1_R, mode=Mode.SUBTRACT)
        with Locations(Location((65, 5, 0), (0, 0, 270))):
            Circle(ESQUISSE1_R, mode=Mode.SUBTRACT)
        with Locations(Location((75, 5, 0), (0, 0, 270))):
            Circle(ESQUISSE1_R, mode=Mode.SUBTRACT)
        with Locations(Location((85, 5, 0), (0, 0, 270))):
            Circle(ESQUISSE1_R, mode=Mode.SUBTRACT)
        with Locations(Location((95, 5, 0), (0, 0, 270))):
            Circle(ESQUISSE1_R, mode=Mode.SUBTRACT)
        with Locations(Location((105, 5, 0), (0, 0, 270))):
            Circle(ESQUISSE1_R, mode=Mode.SUBTRACT)
        with Locations(Location((115, 5, 0), (0, 0, 270))):
            Circle(ESQUISSE1_R, mode=Mode.SUBTRACT)
        with Locations(Location((125, 5, 0), (0, 0, 270))):
            Circle(ESQUISSE1_R, mode=Mode.SUBTRACT)
        with Locations(Location((135, 5, 0), (0, 0, 270))):
            Circle(ESQUISSE1_R, mode=Mode.SUBTRACT)
    extrude(amount=BOSS_EXTRU_1_DEPTH)

    # Esquisse2 → Enlèv. mat.-Extru.1 (cut, up to next)
    with BuildSketch(Plane(origin=(0, 6, 0), x_dir=(1, 0, 0), z_dir=(0, 1, 0)), mode=Mode.PRIVATE) as enl_v_mat_extru_1_sk1:
        with Locations((120, 5)):
            Rectangle(ESQUISSE2_W, ESQUISSE2_H)
    enl_v_mat_extru_1_tool1 = extrude(enl_v_mat_extru_1_sk1.sketch, amount=-ENL_V_MAT_EXTRU_1_REACH, mode=Mode.PRIVATE) & part.part
    add(enl_v_mat_extru_1_tool1.solids().sort_by_distance((120, 6, -5))[0], mode=Mode.SUBTRACT)


solid = part.part
